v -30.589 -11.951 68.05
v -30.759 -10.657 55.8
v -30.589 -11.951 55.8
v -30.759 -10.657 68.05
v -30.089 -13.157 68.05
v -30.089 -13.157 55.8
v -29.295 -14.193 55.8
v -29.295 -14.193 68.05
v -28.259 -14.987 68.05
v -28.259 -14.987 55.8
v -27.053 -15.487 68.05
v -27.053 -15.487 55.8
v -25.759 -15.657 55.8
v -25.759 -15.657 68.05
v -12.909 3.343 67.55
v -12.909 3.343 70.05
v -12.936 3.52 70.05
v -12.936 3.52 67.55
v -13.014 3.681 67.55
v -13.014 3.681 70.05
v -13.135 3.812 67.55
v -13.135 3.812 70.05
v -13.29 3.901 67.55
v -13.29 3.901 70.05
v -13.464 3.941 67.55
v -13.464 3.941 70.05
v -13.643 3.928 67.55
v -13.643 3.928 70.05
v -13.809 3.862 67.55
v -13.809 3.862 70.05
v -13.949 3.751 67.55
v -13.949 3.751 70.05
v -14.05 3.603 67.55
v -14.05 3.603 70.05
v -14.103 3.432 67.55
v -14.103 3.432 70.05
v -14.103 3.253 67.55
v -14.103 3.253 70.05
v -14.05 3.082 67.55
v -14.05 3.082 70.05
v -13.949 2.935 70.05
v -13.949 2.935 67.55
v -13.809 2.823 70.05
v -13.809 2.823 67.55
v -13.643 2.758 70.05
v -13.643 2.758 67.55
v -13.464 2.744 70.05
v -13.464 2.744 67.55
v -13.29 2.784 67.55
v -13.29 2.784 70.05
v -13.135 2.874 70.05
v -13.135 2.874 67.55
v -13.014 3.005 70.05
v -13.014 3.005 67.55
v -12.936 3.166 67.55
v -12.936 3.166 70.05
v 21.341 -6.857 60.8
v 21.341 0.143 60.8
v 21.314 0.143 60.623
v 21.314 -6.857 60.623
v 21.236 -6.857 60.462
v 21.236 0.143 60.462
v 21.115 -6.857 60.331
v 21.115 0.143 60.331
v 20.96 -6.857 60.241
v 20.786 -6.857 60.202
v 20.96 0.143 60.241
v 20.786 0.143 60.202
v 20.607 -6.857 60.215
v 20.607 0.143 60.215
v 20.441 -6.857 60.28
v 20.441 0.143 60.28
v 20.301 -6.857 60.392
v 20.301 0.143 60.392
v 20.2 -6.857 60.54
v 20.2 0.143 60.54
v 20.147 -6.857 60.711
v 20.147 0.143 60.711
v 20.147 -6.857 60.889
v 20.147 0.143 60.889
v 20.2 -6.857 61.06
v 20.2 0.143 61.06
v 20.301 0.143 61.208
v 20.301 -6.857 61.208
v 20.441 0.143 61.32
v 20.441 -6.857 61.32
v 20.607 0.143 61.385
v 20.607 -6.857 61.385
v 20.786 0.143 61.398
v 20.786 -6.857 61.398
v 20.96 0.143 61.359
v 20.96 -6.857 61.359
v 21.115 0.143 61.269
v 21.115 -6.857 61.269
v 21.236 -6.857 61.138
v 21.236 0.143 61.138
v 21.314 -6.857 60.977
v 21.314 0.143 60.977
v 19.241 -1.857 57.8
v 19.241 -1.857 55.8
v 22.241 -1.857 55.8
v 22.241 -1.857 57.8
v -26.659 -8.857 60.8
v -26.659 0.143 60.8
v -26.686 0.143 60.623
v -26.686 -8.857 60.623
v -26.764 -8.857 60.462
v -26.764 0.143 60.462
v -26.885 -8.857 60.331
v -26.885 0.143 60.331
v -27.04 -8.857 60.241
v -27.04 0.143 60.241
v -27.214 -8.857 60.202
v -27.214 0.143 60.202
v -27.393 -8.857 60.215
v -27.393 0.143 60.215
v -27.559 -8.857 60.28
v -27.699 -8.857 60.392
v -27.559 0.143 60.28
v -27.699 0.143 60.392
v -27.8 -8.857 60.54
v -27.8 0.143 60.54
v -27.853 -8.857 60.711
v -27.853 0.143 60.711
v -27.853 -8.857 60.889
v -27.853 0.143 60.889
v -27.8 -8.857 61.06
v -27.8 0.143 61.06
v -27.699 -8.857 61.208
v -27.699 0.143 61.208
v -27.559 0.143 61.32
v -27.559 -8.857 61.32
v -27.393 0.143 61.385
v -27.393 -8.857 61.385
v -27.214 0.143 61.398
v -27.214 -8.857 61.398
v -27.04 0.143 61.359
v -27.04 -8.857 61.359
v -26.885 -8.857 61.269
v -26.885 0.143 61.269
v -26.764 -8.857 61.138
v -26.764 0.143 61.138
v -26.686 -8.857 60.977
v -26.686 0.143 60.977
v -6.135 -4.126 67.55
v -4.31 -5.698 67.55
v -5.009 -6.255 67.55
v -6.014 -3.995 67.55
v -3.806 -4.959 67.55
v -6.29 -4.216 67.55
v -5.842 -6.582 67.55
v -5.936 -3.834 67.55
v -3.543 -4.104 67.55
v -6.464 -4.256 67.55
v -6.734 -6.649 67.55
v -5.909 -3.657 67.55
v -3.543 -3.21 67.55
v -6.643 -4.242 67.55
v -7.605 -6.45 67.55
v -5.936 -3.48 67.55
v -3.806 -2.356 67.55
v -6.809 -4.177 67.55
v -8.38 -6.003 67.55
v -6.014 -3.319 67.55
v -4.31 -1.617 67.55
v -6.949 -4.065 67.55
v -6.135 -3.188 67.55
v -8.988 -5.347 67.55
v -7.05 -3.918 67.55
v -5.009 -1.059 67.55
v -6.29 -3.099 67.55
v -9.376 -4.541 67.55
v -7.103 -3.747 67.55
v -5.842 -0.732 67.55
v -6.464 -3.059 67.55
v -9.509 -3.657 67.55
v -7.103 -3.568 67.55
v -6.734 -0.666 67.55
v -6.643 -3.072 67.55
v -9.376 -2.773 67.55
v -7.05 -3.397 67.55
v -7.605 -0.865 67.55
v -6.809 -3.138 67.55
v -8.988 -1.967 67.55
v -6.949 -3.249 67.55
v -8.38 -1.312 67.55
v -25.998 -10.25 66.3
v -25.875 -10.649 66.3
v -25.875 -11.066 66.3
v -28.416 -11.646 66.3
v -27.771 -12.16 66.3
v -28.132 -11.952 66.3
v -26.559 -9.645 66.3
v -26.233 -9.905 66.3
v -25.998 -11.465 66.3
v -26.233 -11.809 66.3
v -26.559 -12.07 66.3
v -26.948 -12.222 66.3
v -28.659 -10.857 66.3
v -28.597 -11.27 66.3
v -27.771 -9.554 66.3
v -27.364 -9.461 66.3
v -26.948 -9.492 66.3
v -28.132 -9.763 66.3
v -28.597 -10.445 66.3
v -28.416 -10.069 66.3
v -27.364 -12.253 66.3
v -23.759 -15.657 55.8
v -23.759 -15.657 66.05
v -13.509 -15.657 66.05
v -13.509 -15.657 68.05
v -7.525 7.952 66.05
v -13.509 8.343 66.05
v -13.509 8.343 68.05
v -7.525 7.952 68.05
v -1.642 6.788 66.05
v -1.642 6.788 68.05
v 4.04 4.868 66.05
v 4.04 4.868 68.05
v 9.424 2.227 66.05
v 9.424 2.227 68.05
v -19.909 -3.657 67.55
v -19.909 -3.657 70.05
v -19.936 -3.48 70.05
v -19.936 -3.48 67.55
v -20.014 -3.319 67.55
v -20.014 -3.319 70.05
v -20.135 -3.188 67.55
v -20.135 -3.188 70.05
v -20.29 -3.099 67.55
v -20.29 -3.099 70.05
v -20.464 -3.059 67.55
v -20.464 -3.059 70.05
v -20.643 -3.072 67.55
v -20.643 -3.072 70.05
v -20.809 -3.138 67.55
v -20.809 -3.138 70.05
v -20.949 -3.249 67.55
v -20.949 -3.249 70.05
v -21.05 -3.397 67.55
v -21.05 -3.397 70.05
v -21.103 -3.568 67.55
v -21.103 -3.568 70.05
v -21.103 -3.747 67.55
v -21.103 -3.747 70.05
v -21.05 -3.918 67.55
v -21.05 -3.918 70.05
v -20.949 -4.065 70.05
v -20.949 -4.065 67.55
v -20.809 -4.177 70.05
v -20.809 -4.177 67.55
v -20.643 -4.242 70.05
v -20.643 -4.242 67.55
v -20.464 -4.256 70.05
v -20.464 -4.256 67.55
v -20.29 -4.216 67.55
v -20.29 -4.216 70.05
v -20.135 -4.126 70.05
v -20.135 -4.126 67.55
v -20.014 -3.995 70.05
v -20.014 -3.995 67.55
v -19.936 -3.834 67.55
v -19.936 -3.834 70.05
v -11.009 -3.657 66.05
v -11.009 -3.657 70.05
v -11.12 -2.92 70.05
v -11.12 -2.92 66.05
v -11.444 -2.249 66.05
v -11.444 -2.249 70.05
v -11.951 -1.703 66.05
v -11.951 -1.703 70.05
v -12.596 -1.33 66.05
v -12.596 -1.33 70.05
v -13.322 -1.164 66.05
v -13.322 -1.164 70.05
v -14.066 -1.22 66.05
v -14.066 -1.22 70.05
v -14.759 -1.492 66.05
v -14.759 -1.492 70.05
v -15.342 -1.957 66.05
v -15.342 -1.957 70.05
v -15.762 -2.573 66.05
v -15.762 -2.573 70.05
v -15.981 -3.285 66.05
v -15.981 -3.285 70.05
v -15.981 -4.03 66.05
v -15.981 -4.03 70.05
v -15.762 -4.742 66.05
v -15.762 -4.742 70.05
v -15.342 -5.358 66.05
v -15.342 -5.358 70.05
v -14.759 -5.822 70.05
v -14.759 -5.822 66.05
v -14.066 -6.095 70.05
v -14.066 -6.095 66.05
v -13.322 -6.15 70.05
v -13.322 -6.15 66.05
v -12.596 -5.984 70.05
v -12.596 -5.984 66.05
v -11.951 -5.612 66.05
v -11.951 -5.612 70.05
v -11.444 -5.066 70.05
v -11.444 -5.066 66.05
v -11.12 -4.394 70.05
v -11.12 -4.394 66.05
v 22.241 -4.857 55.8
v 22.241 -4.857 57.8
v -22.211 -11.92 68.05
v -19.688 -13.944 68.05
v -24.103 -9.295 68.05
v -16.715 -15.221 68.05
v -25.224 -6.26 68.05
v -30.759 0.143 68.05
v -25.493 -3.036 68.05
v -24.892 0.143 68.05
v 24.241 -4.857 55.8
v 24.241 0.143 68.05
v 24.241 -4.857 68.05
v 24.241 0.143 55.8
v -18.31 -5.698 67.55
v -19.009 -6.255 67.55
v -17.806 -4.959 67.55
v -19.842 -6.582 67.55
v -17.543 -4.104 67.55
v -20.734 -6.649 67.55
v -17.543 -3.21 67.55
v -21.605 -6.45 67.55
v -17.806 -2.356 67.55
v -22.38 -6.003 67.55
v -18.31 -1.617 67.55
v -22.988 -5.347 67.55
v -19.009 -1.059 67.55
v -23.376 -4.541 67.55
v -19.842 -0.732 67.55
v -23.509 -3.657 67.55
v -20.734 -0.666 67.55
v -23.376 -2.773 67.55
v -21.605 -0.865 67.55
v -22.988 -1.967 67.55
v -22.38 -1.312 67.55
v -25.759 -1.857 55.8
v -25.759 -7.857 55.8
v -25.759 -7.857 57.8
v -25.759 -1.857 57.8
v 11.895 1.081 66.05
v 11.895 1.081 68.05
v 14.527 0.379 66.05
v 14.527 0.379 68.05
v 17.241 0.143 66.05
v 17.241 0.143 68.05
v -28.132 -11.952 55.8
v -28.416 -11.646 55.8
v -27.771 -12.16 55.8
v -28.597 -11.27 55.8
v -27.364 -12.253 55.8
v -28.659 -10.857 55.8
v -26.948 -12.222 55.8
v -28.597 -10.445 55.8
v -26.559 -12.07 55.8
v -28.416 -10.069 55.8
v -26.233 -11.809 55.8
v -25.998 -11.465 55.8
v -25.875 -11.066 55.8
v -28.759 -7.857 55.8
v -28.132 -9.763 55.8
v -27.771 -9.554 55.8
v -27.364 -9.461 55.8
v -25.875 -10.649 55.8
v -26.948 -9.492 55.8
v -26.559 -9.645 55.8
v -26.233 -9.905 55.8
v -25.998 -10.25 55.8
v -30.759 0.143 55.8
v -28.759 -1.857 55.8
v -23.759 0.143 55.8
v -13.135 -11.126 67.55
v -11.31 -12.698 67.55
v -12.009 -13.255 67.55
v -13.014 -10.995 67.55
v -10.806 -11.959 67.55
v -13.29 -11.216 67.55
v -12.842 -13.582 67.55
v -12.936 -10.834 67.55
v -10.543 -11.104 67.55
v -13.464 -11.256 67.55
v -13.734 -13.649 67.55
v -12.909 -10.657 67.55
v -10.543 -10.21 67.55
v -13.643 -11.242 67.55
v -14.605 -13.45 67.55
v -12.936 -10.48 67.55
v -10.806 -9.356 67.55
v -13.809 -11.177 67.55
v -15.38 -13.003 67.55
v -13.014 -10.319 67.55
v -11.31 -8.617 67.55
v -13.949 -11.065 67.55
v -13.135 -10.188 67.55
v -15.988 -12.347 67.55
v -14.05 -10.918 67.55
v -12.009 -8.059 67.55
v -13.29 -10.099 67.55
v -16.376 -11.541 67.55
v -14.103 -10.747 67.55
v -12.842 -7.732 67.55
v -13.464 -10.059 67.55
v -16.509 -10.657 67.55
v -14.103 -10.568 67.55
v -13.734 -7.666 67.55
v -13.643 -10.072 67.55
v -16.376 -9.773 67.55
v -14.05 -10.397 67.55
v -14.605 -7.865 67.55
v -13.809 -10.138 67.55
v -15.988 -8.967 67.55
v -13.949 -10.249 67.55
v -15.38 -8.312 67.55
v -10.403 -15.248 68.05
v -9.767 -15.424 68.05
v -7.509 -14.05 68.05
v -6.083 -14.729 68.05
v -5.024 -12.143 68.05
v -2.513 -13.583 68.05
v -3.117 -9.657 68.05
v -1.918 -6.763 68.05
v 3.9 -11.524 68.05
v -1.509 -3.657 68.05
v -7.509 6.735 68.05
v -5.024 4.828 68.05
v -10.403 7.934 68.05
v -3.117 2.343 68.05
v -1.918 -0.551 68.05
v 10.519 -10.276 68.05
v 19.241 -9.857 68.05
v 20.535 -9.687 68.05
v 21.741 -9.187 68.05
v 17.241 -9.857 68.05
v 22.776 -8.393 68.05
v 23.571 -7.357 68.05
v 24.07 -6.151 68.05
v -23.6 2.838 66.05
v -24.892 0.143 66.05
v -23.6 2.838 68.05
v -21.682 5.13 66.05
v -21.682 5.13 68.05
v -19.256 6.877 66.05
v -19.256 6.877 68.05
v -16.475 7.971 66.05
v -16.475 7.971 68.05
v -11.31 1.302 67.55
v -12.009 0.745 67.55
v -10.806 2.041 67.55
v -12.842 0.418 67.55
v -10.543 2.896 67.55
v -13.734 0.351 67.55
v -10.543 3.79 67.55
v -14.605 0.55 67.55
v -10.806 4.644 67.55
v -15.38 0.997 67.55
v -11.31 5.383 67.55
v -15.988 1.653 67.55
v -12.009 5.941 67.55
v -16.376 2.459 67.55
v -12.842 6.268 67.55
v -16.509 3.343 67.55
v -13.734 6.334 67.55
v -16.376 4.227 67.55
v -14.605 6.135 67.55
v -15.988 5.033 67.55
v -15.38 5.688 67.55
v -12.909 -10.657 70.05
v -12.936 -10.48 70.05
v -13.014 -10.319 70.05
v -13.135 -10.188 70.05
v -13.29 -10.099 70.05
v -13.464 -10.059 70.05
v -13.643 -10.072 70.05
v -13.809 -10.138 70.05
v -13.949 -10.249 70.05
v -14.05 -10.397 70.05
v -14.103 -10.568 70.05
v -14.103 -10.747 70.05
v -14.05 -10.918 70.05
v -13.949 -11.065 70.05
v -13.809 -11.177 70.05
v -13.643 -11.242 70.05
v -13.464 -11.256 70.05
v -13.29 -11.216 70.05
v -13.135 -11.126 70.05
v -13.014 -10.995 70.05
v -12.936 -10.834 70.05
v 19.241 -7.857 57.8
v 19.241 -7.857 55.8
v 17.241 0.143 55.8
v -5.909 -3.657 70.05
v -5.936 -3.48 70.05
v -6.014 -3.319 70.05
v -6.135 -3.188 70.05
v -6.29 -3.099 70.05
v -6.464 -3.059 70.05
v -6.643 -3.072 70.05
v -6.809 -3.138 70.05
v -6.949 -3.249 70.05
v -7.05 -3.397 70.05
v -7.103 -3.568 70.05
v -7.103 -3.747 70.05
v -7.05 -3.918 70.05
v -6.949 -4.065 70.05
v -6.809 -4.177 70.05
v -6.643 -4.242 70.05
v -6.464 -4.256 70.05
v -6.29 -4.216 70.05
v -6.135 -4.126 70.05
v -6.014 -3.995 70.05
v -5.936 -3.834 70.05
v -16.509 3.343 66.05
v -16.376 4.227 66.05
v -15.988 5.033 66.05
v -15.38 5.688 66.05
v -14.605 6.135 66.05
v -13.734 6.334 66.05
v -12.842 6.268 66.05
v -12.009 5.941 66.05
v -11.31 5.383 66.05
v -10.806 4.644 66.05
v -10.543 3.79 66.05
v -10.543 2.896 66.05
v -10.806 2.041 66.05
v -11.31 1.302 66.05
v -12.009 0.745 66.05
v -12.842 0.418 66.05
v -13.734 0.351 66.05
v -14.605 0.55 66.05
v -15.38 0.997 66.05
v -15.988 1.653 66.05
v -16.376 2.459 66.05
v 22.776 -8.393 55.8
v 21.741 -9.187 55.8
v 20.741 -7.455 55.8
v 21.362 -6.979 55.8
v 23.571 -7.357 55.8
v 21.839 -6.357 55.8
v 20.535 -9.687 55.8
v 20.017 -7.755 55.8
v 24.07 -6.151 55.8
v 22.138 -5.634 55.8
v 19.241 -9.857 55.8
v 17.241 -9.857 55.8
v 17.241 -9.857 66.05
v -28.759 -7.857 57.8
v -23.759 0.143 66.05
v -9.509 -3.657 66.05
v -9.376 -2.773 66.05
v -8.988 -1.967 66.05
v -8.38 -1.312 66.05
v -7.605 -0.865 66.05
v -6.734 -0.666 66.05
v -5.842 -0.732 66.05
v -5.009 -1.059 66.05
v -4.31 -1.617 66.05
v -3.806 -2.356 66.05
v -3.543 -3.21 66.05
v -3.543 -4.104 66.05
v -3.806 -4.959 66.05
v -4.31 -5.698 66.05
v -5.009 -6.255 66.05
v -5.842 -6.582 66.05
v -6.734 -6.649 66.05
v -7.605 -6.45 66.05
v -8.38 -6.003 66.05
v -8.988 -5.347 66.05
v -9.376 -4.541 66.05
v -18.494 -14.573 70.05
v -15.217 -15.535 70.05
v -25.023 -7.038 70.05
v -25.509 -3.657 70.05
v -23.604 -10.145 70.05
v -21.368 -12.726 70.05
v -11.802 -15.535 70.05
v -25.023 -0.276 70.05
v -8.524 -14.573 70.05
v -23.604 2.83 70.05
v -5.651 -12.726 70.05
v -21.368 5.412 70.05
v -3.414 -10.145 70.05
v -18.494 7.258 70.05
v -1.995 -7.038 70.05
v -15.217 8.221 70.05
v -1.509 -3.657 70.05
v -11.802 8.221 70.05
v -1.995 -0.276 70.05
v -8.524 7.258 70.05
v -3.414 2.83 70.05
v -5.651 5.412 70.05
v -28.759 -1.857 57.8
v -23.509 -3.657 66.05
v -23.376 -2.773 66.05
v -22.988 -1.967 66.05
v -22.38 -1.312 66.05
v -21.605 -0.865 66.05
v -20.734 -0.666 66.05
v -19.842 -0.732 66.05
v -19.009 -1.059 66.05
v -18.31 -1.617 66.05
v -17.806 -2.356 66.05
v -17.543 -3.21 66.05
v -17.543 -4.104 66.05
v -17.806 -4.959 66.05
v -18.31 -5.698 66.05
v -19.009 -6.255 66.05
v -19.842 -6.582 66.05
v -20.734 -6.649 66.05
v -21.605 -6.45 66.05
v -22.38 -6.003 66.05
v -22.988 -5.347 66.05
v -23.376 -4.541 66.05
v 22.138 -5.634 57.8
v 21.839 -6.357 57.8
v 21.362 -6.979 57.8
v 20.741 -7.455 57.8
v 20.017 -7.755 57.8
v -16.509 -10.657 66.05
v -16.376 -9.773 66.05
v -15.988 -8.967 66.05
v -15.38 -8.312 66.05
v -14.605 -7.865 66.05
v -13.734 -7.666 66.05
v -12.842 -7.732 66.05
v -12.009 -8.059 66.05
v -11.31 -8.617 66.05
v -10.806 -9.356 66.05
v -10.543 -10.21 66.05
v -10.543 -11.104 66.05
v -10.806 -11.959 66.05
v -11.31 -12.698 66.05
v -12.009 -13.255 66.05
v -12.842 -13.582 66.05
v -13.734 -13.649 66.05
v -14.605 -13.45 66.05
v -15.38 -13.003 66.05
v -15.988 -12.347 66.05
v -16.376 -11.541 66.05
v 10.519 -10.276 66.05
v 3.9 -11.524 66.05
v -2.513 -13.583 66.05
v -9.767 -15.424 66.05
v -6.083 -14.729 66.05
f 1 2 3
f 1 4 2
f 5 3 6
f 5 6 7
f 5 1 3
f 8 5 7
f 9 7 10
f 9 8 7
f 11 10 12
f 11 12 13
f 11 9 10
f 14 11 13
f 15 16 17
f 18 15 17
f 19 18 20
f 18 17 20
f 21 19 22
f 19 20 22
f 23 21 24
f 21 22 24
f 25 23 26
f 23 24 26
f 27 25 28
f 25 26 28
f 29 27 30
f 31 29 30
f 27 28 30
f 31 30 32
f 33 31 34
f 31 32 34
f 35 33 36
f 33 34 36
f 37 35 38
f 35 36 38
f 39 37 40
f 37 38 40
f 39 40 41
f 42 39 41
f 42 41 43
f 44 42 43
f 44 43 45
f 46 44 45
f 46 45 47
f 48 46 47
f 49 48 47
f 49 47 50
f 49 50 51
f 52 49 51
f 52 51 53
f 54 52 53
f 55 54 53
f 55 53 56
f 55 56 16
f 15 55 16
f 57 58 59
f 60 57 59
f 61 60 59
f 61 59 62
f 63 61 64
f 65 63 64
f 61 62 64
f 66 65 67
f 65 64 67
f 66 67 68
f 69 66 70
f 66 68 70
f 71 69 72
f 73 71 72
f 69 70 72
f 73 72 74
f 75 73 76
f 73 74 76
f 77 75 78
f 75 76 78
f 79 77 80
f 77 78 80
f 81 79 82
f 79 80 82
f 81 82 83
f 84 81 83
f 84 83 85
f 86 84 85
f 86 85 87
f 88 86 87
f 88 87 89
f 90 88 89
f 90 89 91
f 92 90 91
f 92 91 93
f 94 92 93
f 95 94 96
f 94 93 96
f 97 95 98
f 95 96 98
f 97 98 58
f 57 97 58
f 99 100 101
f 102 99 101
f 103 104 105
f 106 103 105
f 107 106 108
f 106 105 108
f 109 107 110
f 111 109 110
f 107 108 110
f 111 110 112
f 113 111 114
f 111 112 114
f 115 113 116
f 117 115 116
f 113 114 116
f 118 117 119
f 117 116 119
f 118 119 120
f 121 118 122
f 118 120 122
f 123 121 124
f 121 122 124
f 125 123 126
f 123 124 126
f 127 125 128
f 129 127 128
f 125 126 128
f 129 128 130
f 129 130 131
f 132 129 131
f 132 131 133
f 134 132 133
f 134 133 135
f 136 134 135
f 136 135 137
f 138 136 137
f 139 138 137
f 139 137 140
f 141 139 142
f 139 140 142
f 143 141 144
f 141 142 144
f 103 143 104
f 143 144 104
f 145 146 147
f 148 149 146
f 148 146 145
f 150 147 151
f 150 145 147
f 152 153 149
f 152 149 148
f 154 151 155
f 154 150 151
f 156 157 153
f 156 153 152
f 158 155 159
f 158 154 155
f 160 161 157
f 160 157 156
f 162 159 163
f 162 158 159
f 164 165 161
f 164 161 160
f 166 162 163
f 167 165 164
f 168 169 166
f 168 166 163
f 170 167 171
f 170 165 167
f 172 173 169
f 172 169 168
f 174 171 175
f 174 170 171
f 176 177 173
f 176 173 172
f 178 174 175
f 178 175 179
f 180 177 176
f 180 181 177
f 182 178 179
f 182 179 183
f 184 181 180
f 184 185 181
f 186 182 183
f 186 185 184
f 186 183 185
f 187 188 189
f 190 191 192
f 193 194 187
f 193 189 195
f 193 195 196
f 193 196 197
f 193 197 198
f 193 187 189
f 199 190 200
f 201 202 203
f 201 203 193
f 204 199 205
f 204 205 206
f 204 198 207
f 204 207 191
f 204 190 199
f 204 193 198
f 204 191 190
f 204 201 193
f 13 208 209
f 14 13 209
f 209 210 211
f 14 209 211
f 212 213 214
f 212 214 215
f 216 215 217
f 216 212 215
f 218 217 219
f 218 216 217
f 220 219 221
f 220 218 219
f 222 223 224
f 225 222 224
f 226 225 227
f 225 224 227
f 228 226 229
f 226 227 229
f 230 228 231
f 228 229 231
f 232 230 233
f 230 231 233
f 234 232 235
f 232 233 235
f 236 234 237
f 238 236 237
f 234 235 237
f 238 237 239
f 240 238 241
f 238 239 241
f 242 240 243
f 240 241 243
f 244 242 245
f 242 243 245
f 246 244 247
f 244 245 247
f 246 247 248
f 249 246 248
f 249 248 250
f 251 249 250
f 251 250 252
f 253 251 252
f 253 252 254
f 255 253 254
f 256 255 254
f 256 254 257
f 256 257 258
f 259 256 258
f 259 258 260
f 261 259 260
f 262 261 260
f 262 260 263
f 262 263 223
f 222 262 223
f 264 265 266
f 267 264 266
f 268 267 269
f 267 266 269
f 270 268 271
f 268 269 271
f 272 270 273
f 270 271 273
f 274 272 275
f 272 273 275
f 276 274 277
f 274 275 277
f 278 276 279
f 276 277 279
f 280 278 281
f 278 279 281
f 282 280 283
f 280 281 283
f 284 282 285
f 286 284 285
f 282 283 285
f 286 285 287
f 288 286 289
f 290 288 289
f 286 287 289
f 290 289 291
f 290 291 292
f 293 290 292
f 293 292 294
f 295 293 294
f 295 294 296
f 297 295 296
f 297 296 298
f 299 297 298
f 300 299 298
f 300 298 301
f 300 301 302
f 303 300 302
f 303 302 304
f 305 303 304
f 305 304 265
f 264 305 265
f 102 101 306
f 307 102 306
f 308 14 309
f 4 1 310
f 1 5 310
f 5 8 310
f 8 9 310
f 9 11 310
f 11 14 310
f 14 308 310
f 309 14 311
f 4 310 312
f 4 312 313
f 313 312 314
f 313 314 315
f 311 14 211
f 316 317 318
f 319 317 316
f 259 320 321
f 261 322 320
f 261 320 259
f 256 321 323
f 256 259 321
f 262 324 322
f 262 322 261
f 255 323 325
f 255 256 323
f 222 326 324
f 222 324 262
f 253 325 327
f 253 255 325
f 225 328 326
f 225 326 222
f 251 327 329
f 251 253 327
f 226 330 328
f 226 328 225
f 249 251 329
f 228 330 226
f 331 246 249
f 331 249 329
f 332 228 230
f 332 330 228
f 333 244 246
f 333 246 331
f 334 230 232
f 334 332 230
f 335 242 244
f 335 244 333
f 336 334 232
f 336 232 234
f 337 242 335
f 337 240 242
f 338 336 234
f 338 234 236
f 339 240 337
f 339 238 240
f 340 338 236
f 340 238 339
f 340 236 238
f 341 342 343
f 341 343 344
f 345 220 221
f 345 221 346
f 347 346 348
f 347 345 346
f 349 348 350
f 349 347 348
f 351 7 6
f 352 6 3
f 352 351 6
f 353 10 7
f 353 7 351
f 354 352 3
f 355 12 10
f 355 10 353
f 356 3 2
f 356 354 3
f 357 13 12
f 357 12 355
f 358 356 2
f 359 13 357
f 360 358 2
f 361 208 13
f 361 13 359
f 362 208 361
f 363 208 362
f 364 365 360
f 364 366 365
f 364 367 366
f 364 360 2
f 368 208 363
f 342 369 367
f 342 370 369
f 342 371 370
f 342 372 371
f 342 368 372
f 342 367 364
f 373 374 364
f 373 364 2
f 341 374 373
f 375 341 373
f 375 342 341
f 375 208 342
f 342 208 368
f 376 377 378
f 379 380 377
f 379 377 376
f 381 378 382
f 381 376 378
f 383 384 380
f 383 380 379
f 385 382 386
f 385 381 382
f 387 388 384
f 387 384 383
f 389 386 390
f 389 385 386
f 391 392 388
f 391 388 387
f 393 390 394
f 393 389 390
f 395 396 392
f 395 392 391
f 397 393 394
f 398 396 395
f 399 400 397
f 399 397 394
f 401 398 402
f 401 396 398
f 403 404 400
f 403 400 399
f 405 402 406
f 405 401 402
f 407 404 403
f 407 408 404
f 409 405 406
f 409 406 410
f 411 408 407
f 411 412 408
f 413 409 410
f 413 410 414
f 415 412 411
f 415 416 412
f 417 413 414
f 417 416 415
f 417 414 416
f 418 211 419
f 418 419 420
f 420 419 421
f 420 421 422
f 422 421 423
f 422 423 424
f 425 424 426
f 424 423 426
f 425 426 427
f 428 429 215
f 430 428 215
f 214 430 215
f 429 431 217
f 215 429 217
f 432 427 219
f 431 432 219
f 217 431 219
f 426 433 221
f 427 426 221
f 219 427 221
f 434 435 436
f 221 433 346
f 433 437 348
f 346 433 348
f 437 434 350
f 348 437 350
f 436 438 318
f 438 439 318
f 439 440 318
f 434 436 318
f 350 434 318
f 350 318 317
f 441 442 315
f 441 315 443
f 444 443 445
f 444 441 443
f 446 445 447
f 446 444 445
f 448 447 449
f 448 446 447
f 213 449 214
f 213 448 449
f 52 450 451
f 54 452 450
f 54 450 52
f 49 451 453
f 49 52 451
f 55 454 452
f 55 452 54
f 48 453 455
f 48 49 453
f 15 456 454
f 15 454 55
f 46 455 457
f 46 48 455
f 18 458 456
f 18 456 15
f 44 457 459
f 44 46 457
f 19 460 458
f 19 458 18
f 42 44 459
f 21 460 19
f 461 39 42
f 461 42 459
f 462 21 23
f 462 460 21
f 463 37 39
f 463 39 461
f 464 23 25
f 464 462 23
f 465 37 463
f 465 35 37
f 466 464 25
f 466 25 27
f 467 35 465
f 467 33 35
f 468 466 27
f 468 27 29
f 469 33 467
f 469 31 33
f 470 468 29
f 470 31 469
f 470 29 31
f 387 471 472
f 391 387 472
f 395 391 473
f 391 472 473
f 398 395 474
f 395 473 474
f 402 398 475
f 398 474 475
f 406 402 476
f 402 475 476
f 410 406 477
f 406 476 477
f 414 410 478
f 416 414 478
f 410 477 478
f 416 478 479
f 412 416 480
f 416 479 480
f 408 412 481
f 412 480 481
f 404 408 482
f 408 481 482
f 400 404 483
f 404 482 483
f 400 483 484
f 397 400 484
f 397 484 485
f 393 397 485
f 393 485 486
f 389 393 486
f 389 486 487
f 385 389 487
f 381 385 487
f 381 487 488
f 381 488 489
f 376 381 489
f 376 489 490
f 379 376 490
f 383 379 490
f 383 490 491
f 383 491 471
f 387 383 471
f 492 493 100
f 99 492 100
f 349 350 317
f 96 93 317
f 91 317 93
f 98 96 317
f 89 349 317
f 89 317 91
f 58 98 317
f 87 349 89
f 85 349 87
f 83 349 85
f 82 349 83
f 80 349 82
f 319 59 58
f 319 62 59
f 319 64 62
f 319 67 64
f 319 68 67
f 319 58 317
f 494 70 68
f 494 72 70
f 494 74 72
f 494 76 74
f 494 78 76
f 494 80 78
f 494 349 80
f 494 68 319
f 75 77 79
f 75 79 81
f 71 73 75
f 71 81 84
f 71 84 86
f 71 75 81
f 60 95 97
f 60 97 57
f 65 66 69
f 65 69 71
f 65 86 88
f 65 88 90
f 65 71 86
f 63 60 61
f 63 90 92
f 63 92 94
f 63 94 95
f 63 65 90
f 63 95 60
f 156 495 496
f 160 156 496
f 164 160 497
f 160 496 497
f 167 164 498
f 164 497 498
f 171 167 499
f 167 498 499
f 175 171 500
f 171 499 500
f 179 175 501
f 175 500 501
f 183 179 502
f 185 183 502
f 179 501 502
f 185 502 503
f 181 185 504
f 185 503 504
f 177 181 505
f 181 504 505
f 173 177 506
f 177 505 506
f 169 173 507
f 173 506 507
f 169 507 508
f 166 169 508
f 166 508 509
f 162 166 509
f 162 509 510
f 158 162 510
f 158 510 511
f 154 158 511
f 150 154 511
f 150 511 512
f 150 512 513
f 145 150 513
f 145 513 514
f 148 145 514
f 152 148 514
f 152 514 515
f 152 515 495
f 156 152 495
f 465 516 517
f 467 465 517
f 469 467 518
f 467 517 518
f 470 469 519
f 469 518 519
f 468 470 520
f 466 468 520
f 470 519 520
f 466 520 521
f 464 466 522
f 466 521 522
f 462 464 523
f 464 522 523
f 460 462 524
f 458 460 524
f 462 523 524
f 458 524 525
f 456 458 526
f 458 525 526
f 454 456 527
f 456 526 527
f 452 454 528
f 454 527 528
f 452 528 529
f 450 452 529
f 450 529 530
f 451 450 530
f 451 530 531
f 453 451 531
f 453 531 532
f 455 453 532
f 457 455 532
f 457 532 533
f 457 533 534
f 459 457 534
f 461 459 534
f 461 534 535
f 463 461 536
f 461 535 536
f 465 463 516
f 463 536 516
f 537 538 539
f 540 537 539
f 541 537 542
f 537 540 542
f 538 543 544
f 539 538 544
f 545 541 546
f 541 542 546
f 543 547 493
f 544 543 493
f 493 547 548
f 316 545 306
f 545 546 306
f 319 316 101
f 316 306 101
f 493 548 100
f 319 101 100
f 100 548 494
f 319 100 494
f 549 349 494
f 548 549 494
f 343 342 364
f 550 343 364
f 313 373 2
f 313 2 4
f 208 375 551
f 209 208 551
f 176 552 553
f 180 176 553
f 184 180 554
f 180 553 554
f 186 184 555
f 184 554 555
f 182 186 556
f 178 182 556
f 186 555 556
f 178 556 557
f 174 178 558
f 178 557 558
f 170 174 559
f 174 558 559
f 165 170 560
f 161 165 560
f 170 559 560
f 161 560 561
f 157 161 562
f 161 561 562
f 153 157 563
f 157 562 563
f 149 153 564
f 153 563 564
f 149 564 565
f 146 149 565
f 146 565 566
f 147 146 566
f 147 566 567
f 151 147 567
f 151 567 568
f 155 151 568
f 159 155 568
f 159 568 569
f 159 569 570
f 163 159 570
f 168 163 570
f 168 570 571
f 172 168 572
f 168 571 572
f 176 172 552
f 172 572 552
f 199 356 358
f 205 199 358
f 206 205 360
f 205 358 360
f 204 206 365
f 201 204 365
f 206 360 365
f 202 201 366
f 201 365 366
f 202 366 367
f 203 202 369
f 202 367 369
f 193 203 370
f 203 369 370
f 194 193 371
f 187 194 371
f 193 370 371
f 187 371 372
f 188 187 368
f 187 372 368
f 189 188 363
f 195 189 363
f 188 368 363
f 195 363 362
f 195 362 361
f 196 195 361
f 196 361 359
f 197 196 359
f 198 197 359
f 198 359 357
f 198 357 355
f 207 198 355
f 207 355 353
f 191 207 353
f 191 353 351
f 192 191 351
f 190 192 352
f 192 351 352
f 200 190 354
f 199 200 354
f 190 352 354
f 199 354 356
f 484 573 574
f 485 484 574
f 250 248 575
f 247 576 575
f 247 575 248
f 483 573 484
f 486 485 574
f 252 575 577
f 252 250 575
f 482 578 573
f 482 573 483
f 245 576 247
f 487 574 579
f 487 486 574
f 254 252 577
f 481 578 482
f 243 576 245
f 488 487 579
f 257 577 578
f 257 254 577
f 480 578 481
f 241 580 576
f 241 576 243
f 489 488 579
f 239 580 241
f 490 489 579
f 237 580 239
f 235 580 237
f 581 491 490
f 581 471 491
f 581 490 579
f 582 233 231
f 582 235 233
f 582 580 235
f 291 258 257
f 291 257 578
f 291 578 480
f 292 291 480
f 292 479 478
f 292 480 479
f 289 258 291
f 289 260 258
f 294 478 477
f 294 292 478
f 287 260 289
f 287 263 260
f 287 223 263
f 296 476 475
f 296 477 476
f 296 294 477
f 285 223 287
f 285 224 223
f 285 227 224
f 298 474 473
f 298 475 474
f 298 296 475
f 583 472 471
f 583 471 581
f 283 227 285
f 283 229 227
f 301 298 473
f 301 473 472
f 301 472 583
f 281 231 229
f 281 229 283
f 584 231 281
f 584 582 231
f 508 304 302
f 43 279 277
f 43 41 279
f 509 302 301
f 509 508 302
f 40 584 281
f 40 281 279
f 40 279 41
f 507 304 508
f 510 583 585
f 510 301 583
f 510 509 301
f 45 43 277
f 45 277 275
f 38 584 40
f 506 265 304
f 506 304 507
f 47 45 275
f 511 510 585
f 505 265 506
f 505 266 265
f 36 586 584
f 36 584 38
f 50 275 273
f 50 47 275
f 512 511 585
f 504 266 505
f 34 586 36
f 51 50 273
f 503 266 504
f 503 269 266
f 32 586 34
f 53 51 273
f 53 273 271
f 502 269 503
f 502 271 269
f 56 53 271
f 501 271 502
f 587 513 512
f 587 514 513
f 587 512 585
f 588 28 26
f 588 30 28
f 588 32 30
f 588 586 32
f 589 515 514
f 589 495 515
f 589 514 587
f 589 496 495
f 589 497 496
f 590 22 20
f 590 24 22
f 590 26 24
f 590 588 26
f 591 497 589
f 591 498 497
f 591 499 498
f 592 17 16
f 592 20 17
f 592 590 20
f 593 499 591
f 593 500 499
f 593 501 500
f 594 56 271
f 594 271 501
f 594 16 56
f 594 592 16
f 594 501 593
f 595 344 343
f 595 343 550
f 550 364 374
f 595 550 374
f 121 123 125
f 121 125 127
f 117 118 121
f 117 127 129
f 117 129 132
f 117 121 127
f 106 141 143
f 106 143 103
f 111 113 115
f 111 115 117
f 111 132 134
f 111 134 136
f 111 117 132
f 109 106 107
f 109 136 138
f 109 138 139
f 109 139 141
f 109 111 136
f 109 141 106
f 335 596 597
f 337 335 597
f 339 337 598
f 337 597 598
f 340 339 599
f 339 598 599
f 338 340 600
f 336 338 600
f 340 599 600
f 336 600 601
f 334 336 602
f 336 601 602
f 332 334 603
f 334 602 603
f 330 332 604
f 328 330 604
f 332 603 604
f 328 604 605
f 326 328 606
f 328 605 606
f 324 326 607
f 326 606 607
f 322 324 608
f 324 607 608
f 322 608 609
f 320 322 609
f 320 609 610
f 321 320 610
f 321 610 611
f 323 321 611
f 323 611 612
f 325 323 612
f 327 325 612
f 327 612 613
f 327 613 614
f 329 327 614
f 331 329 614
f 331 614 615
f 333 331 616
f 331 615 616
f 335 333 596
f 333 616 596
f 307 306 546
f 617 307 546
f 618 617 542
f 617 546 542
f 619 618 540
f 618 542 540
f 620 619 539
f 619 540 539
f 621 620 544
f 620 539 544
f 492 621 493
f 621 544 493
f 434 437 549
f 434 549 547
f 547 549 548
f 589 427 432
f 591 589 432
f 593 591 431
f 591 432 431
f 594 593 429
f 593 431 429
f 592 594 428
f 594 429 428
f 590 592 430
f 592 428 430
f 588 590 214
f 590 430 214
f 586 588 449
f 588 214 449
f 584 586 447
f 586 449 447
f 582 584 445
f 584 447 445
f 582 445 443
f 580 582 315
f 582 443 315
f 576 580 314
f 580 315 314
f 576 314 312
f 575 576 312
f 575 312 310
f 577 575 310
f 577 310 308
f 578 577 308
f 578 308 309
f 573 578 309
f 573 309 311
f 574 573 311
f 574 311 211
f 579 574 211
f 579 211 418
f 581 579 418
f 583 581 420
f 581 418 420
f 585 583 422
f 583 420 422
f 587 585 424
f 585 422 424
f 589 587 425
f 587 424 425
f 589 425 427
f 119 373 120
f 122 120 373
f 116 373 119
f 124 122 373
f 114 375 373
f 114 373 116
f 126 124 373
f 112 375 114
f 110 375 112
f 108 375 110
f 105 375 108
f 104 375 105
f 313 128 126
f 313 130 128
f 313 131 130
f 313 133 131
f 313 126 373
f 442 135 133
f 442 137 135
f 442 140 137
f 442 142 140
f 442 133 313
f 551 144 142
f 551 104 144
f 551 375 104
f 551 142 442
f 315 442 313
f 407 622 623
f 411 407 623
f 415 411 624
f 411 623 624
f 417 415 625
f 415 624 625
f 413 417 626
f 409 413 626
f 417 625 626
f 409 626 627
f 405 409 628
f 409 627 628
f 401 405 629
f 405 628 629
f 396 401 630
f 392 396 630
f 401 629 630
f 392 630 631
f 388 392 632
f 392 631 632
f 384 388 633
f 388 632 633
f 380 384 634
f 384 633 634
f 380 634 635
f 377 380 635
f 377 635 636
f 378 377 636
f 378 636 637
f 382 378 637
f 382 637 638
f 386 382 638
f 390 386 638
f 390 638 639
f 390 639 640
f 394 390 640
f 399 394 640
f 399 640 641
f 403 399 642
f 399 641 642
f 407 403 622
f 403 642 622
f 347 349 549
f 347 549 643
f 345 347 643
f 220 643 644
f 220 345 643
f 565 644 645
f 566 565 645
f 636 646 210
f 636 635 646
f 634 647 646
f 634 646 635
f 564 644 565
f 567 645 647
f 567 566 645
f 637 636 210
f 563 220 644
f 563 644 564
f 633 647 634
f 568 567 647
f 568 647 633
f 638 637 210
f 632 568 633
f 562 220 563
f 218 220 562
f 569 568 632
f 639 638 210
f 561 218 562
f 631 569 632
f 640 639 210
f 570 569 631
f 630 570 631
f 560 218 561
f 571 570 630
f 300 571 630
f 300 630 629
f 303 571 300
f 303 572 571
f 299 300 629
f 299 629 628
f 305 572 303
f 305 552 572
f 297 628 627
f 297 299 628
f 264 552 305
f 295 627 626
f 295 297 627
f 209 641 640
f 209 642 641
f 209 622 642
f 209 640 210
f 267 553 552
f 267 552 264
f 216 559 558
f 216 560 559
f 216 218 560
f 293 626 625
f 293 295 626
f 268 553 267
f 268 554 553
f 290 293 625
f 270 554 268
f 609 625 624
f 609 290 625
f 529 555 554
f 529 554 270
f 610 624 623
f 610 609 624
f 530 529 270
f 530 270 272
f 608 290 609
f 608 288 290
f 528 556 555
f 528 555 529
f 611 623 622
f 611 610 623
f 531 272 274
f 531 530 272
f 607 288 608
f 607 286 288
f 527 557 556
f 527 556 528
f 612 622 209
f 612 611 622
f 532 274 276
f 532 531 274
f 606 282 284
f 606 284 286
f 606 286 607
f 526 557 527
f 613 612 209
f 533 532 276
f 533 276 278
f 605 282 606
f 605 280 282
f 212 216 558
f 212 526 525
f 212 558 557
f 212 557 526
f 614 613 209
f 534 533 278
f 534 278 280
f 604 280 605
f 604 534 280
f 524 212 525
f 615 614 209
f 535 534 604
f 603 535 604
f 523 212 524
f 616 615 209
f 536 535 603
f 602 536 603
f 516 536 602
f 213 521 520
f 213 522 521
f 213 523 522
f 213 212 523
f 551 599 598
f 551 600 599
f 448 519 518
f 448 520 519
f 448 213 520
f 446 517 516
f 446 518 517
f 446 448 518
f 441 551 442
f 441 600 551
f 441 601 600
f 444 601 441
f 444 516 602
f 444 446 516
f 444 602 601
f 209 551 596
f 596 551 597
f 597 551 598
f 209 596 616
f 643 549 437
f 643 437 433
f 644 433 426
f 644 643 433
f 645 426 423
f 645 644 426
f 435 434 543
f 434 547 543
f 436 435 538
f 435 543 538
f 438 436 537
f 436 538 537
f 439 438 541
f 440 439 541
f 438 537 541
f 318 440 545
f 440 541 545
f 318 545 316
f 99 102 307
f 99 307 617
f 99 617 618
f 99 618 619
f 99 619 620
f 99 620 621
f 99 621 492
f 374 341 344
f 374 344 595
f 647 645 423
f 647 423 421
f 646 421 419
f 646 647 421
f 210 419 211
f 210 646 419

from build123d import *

# Parameters (mm, degrees)
SALIENTE_EXTRUIR1_DEPTH = 2
CROQUIS2_W              = 12.25
CROQUIS2_H              = 10
SALIENTE_EXTRUIR2_DEPTH = 7
REDONDEO1_R             = 5
CORTAR_EXTRUIR1_DEPTH   = 2
CROQUIS4_R              = 0.6
CORTAR_EXTRUIR2_DEPTH   = 7
CROQUIS5_W              = 12.25
CROQUIS5_H              = 15.8
SALIENTE_EXTRUIR3_DEPTH = 7
REDONDEO2_R             = 5
CROQUIS6_R              = 0.6
CORTAR_EXTRUIR3_DEPTH   = 9
CROQUIS7_W              = 3
CROQUIS7_H              = 6
CORTAR_EXTRUIR4_DEPTH   = 2
CROQUIS8_R              = 12
SALIENTE_EXTRUIR4_DEPTH = 2
CROQUIS9_R              = 2.5
CORTAR_EXTRUIR5_DEPTH   = 6
CROQUIS10_R             = 0.6
CORTAR_EXTRUIR6_DEPTH   = 6
CROQUIS11_R             = 3
CORTAR_EXTRUIR7_DEPTH   = 1.5
CROQUIS12_R             = 1.4
CORTAR_EXTRUIR8_DEPTH   = 10.5


with BuildPart() as part:
    # Croquis1 → Saliente-Extruir1 (new body)
    with BuildSketch(Plane.XY.offset(66.05)):
        with BuildLine():
            Line((17.240678969, 0.142768675), (17.240678969, -9.857231325))
            ThreePointArc((17.240678969, -9.857231325), (7.189890991, -10.796826624), (-2.512589694, -13.583051105))
            ThreePointArc((-2.512589694, -13.583051105), (-7.914003263, -15.134154499), (-13.509321031, -15.657231325))
            Line((-13.509321031, -15.657231325), (-25.509321031, -15.657231325))
            Line((-25.509321031, -15.657231325), (-25.509321031, -3.657231325))
            ThreePointArc((-25.509321031, -3.657231325), (-21.994602405, 4.82805005), (-13.509321031, 8.342768675))
            ThreePointArc((-13.509321031, 8.342768675), (-1.641917085, 6.787620461), (9.424079639, 2.227195163))
            ThreePointArc((9.424079639, 2.227195163), (13.195803851, 0.672823972), (17.240678969, 0.142768675))
        make_face()
    extrude(amount=SALIENTE_EXTRUIR1_DEPTH)

    # Croquis2 → Saliente-Extruir2 (add)
    with BuildSketch(Plane(origin=(17.240678969, 0, 0), x_dir=(0, 0, -1), z_dir=(1, 0, 0))):
        with Locations((-61.925, -4.857231325)):
            Rectangle(CROQUIS2_W, CROQUIS2_H)
    extrude(amount=SALIENTE_EXTRUIR2_DEPTH)

    # Redondeo1
    redondeo1_edges = [part.edges().sort_by_distance(p)[0] for p in [
        (24.240678969, -9.857231325, 61.925),
    ]]
    fillet(redondeo1_edges, radius=REDONDEO1_R)

    # Croquis3 → Cortar-Extruir1 (cut)
    with BuildSketch(Plane(origin=(0, 0, 55.8), x_dir=(-1, 0, 0), z_dir=(0, 0, -1))):
        with BuildLine():
            Line((-19.240678969, -1.857231325), (-22.240678969, -1.857231325))
            Line((-22.240678969, -1.857231325), (-22.240678969, -4.857231325))
            ThreePointArc((-22.240678969, -4.857231325), (-21.361999312, -6.978551668), (-19.240678969, -7.857231325))
            Line((-19.240678969, -7.857231325), (-19.240678969, -1.857231325))
        make_face()
    extrude(amount=-CORTAR_EXTRUIR1_DEPTH, mode=Mode.SUBTRACT)

    # Croquis4 → Cortar-Extruir2 (cut)
    with BuildSketch(Plane(origin=(0, 0.142768675, 0), x_dir=(1, 0, 0), z_dir=(0, 1, 0))):
        with Locations((20.740678969, -60.8)):
            Circle(CROQUIS4_R)
    extrude(amount=-CORTAR_EXTRUIR2_DEPTH, mode=Mode.SUBTRACT)

    # Croquis5 → Saliente-Extruir3 (add)
    with BuildSketch(Plane.ZY.offset(23.759321031)):
        with Locations((61.925, -7.757231325)):
            Rectangle(CROQUIS5_W, CROQUIS5_H)
    extrude(amount=SALIENTE_EXTRUIR3_DEPTH)

    # Redondeo2
    redondeo2_edges = [part.edges().sort_by_distance(p)[0] for p in [
        (-30.759321031, -15.657231325, 61.925),
    ]]
    fillet(redondeo2_edges, radius=REDONDEO2_R)

    # Croquis6 → Cortar-Extruir3 (cut)
    with BuildSketch(Plane(origin=(0, 0.142768675, 0), x_dir=(1, 0, 0), z_dir=(0, 1, 0))):
        with Locations((-27.259321031, -60.8)):
            Circle(CROQUIS6_R)
    extrude(amount=-CORTAR_EXTRUIR3_DEPTH, mode=Mode.SUBTRACT)

    # Croquis7 → Cortar-Extruir4 (cut)
    with BuildSketch(Plane(origin=(0, 0, 55.8), x_dir=(-1, 0, 0), z_dir=(0, 0, -1))):
        with Locations((27.259321031, -4.857231325)):
            Rectangle(CROQUIS7_W, CROQUIS7_H)
    extrude(amount=-CORTAR_EXTRUIR4_DEPTH, mode=Mode.SUBTRACT)

    # Croquis8 → Saliente-Extruir4 (add)
    with BuildSketch(Plane.XY.offset(68.05)):
        with Locations((-13.509321031, -3.657231325)):
            Circle(CROQUIS8_R)
    extrude(amount=SALIENTE_EXTRUIR4_DEPTH)

    # Croquis9 → Cortar-Extruir5 (cut)
    with BuildSketch(Plane.XY.offset(70.05)):
        with Locations((-13.509321031, -3.657231325)):
            Circle(CROQUIS9_R)
    extrude(amount=-CORTAR_EXTRUIR5_DEPTH, mode=Mode.SUBTRACT)

    # Croquis10 → Cortar-Extruir6 (cut)
    with BuildSketch(Plane.XY.offset(70.05)):
        with Locations((-13.509321031, 3.342768675)):
            Circle(CROQUIS10_R)
        with Locations((-6.509321031, -3.657231325)):
            Circle(CROQUIS10_R)
        with Locations((-13.509321031, -10.657231325)):
            Circle(CROQUIS10_R)
        with Locations((-20.509321031, -3.657231325)):
            Circle(CROQUIS10_R)
    extrude(amount=-CORTAR_EXTRUIR6_DEPTH, mode=Mode.SUBTRACT)

    # Croquis11 → Cortar-Extruir7 (cut)
    with BuildSketch(Plane(origin=(0, 0, 66.05), x_dir=(-1, 0, 0), z_dir=(0, 0, -1))):
        with Locations((13.509321031, 3.342768675)):
            Circle(CROQUIS11_R)
        with Locations((20.509321031, -3.657231325)):
            Circle(CROQUIS11_R)
        with Locations((13.509321031, -10.657231325)):
            Circle(CROQUIS11_R)
        with Locations((6.509321031, -3.657231325)):
            Circle(CROQUIS11_R)
    extrude(amount=-CORTAR_EXTRUIR7_DEPTH, mode=Mode.SUBTRACT)

    # Croquis12 → Cortar-Extruir8 (cut)
    with BuildSketch(Plane(origin=(0, 0, 55.8), x_dir=(-1, 0, 0), z_dir=(0, 0, -1))):
        with Locations((27.259321031, -10.857231325)):
            Circle(CROQUIS12_R)
    extrude(amount=-CORTAR_EXTRUIR8_DEPTH, mode=Mode.SUBTRACT)


solid = part.part
